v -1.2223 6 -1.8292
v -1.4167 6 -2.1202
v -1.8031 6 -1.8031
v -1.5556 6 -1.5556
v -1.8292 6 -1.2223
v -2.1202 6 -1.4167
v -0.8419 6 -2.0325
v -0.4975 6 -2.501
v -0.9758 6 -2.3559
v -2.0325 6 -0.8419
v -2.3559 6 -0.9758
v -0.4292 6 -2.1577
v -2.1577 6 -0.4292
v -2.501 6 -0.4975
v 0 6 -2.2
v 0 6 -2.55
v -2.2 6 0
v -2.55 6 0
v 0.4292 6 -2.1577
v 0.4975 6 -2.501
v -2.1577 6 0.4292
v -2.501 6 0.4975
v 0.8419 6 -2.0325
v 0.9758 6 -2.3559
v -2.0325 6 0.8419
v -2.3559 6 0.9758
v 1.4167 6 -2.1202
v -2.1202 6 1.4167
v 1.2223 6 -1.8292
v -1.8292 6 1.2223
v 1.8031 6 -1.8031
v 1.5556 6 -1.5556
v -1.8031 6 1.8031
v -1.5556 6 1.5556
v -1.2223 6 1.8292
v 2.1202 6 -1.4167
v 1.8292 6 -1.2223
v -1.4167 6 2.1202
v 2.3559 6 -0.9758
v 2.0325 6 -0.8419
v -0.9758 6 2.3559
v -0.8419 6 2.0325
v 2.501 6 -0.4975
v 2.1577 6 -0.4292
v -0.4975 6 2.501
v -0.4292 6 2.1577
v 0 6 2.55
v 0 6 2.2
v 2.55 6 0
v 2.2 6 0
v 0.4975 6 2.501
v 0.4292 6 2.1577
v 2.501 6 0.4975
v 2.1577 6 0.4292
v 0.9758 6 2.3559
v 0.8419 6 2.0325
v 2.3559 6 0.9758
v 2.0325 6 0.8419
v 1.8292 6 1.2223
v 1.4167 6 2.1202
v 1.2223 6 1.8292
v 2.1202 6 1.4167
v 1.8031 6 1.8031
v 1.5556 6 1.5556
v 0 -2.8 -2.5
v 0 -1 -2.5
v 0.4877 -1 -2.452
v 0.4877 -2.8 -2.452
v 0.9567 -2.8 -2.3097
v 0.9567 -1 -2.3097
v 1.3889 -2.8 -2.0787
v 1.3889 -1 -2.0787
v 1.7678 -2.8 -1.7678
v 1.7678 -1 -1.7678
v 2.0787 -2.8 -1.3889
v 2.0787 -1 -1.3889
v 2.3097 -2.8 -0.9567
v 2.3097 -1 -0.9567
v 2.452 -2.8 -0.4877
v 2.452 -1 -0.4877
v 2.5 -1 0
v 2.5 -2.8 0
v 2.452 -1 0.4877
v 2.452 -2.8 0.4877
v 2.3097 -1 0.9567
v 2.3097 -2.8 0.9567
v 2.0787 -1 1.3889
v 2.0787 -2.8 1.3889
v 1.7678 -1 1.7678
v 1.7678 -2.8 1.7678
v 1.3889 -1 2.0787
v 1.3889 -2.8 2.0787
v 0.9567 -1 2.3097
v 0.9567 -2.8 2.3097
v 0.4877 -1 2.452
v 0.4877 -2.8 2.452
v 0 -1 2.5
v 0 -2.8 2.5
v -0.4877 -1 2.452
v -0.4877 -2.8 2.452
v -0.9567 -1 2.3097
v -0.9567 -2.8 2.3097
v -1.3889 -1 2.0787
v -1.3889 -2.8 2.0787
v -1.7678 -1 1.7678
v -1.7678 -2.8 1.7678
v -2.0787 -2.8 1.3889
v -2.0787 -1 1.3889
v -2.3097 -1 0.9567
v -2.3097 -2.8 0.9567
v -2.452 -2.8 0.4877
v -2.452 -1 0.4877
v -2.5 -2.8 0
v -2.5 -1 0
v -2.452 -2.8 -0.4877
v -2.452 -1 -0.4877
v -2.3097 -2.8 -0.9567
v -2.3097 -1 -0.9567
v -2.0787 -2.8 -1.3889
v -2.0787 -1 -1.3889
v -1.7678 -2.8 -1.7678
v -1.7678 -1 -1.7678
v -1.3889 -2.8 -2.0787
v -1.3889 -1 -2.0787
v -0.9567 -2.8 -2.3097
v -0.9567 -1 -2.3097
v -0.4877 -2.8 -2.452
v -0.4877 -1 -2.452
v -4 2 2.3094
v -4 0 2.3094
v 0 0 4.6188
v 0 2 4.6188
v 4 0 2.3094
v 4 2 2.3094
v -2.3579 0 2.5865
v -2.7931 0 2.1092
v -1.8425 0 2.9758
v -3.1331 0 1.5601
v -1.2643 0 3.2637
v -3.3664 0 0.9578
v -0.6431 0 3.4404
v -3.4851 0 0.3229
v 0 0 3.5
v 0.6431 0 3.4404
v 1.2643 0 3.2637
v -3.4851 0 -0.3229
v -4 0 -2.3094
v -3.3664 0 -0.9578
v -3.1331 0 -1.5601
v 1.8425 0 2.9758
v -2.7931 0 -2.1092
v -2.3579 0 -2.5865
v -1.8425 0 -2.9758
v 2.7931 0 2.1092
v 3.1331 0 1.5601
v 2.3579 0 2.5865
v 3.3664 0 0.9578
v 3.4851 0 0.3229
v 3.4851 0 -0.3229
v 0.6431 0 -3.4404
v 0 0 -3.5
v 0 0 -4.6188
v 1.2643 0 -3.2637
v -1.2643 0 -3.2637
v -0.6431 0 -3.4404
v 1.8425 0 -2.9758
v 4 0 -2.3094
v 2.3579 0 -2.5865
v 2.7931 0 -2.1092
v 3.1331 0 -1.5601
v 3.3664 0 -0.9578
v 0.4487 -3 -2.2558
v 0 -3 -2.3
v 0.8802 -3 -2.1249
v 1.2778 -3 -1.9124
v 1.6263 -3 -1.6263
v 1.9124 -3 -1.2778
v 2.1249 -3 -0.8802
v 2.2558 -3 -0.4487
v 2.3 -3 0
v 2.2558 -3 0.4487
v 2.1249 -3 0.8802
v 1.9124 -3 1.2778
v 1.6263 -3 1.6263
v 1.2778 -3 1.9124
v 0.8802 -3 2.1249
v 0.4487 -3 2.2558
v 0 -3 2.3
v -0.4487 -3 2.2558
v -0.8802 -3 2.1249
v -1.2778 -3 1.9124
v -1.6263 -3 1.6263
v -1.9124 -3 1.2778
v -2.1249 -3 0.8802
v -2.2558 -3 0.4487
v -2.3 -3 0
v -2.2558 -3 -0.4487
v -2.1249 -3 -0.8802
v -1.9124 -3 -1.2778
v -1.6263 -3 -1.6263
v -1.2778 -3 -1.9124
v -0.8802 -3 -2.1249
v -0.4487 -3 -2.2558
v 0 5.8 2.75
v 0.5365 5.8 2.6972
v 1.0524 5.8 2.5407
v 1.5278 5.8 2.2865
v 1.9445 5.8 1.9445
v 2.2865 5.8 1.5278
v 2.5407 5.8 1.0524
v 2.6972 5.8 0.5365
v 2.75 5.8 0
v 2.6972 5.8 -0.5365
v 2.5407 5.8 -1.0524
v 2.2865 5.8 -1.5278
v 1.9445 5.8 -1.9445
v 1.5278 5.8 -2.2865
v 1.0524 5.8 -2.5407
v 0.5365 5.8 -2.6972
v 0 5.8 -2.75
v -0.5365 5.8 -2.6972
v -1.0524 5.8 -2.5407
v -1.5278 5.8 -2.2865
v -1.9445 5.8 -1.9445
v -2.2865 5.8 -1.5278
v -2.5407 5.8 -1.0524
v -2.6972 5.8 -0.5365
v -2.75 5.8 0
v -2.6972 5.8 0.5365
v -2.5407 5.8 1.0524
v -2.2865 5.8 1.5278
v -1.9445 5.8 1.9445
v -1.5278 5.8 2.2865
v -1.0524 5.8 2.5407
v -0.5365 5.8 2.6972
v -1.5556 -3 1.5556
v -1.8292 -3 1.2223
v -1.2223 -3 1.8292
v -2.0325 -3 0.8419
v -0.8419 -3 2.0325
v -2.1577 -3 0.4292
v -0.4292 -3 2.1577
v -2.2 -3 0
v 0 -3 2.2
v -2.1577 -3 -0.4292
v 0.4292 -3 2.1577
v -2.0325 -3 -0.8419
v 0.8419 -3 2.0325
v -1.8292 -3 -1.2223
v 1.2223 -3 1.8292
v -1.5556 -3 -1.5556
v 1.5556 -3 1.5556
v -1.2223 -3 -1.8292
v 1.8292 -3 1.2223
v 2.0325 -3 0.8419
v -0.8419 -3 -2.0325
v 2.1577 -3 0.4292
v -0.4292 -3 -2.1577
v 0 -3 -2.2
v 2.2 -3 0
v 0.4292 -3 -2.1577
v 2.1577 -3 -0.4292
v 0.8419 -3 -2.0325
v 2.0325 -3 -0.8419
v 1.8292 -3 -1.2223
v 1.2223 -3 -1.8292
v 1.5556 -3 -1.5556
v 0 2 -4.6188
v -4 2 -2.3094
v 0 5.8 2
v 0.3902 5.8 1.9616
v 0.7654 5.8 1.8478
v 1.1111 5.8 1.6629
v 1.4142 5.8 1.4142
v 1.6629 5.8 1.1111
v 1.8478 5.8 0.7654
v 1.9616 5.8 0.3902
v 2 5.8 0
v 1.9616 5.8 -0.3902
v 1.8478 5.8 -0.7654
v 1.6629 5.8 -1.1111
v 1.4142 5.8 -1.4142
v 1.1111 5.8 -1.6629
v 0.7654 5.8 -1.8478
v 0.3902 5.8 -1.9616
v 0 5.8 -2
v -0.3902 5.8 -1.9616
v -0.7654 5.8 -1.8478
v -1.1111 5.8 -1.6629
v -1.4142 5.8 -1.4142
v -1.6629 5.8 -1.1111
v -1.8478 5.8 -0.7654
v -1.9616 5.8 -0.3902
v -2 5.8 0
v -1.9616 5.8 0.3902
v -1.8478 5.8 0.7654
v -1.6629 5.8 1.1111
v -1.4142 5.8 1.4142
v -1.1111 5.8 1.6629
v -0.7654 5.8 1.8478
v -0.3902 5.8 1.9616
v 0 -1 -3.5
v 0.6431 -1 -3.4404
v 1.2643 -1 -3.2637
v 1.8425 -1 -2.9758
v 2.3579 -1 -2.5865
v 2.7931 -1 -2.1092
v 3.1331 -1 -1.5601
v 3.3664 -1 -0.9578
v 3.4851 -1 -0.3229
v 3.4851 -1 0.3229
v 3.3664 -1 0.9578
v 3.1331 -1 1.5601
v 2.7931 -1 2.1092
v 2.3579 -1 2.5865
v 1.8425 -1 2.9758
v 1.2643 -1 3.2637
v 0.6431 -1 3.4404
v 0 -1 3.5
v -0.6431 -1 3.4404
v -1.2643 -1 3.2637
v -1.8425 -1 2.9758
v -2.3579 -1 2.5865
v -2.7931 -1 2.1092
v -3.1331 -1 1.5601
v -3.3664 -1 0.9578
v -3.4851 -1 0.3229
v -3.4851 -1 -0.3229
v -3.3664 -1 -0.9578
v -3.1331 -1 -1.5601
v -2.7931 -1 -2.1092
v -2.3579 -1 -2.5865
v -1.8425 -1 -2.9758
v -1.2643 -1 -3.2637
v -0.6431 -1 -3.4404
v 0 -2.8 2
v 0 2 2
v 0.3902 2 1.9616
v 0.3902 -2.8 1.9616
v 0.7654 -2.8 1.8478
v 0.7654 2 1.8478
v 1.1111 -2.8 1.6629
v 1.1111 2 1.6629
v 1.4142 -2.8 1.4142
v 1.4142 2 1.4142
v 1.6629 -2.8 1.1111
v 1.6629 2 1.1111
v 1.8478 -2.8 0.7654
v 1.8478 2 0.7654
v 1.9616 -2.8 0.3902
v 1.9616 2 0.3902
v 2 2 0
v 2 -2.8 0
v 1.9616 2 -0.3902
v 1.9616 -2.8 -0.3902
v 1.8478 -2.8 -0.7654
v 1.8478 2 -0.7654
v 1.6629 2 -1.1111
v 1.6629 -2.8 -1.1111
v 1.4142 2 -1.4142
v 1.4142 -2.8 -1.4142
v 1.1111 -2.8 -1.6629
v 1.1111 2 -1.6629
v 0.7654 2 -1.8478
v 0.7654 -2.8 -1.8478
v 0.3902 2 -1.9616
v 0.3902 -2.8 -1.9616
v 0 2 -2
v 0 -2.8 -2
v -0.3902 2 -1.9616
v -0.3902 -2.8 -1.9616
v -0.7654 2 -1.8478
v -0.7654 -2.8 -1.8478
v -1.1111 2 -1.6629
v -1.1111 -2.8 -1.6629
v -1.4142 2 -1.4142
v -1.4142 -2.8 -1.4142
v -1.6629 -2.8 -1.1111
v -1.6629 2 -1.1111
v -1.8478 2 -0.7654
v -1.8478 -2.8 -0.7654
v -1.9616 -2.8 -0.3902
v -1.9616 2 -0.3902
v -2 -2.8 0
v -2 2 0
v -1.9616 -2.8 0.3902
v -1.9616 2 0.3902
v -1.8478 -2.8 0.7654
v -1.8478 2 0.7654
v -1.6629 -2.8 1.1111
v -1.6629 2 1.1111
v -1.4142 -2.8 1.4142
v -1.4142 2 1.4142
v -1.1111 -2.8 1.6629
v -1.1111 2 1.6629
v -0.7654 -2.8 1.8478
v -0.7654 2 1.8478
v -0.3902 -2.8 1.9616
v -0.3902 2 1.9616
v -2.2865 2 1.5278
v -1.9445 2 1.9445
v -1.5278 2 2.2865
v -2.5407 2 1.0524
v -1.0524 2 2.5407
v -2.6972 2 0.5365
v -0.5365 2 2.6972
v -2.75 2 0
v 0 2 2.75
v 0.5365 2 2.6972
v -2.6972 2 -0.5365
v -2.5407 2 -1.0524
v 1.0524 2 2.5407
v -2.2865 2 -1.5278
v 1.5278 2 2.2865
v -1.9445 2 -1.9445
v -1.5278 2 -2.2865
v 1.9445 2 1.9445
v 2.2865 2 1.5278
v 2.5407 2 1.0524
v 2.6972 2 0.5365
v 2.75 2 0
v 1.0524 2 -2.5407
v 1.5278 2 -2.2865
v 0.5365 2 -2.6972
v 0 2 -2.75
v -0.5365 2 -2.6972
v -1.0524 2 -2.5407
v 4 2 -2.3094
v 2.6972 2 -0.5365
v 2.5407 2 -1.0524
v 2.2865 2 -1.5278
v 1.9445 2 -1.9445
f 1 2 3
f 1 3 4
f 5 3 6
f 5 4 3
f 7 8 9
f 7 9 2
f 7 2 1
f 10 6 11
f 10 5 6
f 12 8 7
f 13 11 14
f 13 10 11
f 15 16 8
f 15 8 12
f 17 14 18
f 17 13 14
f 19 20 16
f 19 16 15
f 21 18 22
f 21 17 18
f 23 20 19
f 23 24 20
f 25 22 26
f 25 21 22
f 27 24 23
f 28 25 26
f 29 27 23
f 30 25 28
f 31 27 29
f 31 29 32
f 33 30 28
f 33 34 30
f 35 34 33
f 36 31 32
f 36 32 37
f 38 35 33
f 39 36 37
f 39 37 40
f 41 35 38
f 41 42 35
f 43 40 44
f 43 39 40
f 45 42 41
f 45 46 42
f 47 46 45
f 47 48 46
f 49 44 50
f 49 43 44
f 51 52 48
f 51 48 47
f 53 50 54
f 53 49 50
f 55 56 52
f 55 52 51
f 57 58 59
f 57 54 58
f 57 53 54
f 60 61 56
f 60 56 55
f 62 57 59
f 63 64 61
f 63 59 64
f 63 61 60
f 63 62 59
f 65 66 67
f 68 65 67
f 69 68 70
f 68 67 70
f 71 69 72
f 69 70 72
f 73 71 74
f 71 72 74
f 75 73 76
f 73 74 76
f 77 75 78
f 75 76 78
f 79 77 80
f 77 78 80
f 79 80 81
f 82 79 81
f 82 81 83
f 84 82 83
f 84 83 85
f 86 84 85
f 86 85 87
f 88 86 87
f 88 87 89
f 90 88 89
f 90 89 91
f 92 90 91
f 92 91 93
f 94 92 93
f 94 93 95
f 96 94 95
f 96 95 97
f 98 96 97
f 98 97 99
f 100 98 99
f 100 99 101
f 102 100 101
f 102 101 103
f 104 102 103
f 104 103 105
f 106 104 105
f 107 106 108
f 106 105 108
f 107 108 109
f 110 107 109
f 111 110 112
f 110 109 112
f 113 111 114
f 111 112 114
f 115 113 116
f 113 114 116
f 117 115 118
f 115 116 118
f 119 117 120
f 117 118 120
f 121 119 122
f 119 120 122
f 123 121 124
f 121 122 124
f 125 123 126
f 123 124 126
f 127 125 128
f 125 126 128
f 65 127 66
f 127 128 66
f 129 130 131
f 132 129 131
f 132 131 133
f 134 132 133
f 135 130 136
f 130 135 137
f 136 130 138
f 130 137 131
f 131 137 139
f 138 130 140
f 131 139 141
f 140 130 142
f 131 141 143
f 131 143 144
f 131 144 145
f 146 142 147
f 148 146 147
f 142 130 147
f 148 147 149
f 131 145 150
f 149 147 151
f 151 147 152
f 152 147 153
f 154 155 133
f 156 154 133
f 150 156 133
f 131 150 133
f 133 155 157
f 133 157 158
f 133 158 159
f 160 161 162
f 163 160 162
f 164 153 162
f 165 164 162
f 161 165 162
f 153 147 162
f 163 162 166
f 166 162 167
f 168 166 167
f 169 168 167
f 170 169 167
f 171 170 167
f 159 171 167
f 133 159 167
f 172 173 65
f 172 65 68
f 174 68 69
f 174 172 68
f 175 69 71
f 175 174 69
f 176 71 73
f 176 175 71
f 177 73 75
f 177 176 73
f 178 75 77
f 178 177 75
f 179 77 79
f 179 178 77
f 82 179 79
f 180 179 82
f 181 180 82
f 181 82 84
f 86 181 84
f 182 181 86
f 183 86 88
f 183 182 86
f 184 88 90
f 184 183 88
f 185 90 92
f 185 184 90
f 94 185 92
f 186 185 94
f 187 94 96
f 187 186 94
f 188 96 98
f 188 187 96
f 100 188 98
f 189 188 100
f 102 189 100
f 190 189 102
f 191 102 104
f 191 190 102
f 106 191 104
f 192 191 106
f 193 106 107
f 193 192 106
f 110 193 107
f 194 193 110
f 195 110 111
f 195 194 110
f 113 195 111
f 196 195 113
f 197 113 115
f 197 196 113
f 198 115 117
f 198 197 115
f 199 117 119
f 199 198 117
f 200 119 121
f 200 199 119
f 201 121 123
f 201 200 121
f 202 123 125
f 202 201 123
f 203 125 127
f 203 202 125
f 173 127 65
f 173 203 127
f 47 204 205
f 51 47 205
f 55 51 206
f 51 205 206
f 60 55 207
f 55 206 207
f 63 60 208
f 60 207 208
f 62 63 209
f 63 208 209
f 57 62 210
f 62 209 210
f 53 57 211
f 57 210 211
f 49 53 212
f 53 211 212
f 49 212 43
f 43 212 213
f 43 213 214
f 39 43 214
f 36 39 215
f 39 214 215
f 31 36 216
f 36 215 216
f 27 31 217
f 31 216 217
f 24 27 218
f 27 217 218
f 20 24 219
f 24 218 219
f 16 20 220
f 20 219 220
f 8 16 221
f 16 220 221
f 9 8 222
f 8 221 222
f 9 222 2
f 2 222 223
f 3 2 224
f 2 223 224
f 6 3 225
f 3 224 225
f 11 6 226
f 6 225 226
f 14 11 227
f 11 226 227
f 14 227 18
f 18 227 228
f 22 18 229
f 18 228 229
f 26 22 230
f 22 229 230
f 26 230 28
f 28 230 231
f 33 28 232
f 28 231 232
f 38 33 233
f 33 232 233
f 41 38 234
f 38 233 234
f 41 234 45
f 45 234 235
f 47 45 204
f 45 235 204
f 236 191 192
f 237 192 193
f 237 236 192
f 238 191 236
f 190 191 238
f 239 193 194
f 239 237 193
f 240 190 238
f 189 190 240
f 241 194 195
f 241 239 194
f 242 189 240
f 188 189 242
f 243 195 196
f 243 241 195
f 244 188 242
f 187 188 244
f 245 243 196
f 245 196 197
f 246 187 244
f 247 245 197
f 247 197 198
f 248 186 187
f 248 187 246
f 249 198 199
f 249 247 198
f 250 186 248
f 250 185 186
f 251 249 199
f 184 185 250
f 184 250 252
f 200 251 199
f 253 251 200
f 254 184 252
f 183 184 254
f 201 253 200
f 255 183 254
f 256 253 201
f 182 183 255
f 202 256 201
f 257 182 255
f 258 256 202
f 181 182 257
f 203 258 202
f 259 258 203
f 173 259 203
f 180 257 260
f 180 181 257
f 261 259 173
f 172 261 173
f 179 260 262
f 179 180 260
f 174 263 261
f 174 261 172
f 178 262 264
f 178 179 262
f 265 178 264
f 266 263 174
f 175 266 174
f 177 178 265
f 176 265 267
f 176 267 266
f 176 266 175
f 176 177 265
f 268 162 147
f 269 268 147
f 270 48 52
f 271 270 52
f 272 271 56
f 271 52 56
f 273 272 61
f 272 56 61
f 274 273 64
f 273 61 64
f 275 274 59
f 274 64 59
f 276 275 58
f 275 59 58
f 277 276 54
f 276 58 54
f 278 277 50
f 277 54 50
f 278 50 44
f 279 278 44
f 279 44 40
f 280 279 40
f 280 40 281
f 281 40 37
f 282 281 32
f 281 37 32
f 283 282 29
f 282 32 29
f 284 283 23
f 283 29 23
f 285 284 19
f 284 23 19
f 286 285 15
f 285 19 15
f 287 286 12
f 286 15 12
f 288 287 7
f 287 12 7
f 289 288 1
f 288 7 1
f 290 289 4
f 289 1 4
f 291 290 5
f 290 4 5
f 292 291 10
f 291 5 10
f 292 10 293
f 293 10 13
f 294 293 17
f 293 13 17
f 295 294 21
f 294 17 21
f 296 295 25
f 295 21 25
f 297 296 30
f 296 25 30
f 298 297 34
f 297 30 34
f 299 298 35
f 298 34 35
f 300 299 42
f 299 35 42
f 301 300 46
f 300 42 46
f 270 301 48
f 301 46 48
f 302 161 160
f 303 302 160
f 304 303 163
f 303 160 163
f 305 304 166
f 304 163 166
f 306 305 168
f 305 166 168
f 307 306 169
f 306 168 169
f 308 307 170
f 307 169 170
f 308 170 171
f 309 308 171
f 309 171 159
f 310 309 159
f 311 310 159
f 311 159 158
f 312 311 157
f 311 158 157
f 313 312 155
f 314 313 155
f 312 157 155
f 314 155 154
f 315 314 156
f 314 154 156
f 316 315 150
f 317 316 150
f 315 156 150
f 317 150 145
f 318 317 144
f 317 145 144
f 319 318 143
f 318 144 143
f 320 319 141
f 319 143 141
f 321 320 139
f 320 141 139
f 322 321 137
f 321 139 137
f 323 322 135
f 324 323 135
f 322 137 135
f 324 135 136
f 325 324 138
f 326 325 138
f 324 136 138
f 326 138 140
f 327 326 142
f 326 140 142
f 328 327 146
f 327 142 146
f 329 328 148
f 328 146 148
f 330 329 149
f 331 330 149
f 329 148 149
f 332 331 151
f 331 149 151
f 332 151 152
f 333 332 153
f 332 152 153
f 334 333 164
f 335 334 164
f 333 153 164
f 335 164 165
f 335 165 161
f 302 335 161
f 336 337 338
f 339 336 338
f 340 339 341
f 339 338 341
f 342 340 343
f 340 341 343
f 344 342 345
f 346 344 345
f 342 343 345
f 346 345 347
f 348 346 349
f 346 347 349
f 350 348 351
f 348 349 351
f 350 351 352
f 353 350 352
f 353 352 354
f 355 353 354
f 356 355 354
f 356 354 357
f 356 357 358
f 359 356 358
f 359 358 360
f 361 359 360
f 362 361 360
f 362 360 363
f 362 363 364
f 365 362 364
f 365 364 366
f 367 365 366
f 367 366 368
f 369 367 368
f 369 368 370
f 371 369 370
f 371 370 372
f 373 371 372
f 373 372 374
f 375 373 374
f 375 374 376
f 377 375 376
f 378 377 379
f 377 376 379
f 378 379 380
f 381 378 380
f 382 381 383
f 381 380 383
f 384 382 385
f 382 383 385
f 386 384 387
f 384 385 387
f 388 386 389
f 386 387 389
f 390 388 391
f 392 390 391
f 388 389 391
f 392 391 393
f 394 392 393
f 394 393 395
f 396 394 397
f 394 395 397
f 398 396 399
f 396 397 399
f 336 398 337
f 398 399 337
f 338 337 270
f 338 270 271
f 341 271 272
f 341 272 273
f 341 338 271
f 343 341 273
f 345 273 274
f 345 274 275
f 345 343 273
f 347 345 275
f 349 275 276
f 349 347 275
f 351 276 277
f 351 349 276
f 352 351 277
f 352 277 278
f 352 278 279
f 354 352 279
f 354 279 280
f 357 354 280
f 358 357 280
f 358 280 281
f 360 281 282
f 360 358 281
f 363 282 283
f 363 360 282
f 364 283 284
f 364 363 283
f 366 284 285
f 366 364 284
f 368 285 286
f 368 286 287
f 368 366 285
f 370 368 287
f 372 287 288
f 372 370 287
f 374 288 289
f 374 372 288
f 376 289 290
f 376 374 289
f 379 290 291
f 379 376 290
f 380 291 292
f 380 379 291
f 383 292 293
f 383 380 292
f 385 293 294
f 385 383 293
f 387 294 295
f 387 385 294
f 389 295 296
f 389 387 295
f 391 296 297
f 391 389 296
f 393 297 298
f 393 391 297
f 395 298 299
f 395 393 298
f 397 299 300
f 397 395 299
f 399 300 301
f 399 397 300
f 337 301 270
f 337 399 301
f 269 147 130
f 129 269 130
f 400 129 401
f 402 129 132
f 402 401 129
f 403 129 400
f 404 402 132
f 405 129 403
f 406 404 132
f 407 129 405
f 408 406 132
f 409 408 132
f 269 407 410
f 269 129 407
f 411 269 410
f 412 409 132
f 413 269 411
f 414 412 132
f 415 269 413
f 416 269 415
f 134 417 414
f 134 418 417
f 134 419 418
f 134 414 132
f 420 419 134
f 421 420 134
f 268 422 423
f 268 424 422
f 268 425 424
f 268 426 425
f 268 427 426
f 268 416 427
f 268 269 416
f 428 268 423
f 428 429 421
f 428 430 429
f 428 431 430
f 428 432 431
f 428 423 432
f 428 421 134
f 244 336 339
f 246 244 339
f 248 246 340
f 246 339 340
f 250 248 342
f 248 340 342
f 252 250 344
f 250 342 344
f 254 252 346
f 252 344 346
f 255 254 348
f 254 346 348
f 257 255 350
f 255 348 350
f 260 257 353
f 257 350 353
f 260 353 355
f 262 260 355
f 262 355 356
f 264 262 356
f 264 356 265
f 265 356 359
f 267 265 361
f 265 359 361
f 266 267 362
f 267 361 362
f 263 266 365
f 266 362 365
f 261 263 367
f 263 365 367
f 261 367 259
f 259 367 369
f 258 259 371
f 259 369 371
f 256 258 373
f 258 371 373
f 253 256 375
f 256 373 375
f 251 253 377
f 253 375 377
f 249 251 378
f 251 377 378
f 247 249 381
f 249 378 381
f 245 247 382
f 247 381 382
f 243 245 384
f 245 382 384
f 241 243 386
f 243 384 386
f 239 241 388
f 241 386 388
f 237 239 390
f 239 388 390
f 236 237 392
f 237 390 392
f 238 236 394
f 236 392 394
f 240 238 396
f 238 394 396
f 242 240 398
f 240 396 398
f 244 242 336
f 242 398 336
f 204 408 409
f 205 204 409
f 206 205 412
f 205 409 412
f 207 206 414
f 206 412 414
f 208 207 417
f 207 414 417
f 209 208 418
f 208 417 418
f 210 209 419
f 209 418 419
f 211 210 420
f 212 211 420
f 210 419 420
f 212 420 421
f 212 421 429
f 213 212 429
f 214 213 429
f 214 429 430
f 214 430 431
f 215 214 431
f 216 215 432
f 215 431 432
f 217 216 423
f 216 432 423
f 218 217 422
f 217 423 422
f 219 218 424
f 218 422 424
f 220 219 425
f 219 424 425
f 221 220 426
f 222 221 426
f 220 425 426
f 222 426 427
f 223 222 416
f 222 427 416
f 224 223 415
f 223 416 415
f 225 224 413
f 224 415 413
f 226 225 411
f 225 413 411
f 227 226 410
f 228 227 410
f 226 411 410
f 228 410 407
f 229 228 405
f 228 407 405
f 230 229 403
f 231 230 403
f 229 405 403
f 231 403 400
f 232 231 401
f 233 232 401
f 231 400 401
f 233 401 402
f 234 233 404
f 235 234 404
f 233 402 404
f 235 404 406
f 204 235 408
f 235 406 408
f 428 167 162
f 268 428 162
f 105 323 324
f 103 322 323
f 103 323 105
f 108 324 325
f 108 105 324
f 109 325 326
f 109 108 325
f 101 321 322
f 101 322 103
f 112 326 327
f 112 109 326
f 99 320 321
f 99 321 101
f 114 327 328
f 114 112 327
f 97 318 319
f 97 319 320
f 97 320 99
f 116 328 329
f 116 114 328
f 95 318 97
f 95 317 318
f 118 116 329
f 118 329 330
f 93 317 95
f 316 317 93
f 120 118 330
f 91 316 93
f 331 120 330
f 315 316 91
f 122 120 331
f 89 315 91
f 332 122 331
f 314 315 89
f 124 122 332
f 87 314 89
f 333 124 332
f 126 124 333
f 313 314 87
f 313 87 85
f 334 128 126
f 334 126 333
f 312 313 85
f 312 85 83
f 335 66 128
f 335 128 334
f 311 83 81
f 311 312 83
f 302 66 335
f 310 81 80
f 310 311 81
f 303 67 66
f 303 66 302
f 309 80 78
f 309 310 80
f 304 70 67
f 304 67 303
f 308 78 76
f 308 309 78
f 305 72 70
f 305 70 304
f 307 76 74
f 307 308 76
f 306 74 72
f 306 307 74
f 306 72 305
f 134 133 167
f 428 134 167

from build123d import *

# Parameters (mm, degrees)
BOSS_EXTRUDE1_DEPTH = 2
SKETCH2_R           = 2.75
BOSS_EXTRUDE2_DEPTH = 4
SKETCH2_3_R         = 2
CUT_EXTRUDE1_DEPTH  = 4
SKETCH3_R           = 3.5
BOSS_EXTRUDE3_DEPTH = 1
SKETCH3_4_R         = 2.5
BOSS_EXTRUDE4_DEPTH = 3
SKETCH4_R           = 2
CUT_EXTRUDE3_DEPTH  = 8.895146188
CHAMFER1_SIZE       = 0.2


with BuildPart() as part:
    # Sketch1 → Boss-Extrude1 (new body)
    with BuildSketch(Plane(origin=(0, 0, 0), x_dir=(1, 0, 0), z_dir=(0, 1, 0))):
        Polygon((0, 4.618802154), (-4, 2.309401077), (-4, -2.309401077), (0, -4.618802154), (4, -2.309401077), (4, 2.309401077), align=None)
    extrude(amount=BOSS_EXTRUDE1_DEPTH)

    # Sketch2 → Boss-Extrude2 (add)
    with BuildSketch(Plane(origin=(0, 2, 0), x_dir=(1, 0, 0), z_dir=(0, 1, 0))):
        Circle(SKETCH2_R)
    extrude(amount=BOSS_EXTRUDE2_DEPTH)

    # Sketch2<3> → Cut-Extrude1 (cut)
    with BuildSketch(Plane(origin=(0, 2, 0), x_dir=(1, 0, 0), z_dir=(0, 1, 0))):
        Circle(SKETCH2_3_R)
    extrude(amount=CUT_EXTRUDE1_DEPTH, mode=Mode.SUBTRACT)

    # Sketch3 → Boss-Extrude3 (add)
    with BuildSketch(Plane.XZ):
        Circle(SKETCH3_R)
    extrude(amount=BOSS_EXTRUDE3_DEPTH)

    # Sketch3<4> → Boss-Extrude4 (add)
    with BuildSketch(Plane.XZ):
        Circle(SKETCH3_4_R)
    extrude(amount=BOSS_EXTRUDE4_DEPTH)

    # Sketch4 → Cut-Extrude3 (cut, through all)
    with BuildSketch(Plane(origin=(0, 2, 0), x_dir=(1, 0, 0), z_dir=(0, 1, 0))):
        Circle(SKETCH4_R)
    extrude(amount=-CUT_EXTRUDE3_DEPTH, mode=Mode.SUBTRACT)

    # Chamfer1
    chamfer1_edges = [part.edges().sort_by_distance(p)[0] for p in [
        (-2.75, 6, 0),
        (-2, 6, 0),
        (-2.5, -3, 0),
        (-2, -3, 0),
    ]]
    chamfer(chamfer1_edges, length=CHAMFER1_SIZE)


solid = part.part
